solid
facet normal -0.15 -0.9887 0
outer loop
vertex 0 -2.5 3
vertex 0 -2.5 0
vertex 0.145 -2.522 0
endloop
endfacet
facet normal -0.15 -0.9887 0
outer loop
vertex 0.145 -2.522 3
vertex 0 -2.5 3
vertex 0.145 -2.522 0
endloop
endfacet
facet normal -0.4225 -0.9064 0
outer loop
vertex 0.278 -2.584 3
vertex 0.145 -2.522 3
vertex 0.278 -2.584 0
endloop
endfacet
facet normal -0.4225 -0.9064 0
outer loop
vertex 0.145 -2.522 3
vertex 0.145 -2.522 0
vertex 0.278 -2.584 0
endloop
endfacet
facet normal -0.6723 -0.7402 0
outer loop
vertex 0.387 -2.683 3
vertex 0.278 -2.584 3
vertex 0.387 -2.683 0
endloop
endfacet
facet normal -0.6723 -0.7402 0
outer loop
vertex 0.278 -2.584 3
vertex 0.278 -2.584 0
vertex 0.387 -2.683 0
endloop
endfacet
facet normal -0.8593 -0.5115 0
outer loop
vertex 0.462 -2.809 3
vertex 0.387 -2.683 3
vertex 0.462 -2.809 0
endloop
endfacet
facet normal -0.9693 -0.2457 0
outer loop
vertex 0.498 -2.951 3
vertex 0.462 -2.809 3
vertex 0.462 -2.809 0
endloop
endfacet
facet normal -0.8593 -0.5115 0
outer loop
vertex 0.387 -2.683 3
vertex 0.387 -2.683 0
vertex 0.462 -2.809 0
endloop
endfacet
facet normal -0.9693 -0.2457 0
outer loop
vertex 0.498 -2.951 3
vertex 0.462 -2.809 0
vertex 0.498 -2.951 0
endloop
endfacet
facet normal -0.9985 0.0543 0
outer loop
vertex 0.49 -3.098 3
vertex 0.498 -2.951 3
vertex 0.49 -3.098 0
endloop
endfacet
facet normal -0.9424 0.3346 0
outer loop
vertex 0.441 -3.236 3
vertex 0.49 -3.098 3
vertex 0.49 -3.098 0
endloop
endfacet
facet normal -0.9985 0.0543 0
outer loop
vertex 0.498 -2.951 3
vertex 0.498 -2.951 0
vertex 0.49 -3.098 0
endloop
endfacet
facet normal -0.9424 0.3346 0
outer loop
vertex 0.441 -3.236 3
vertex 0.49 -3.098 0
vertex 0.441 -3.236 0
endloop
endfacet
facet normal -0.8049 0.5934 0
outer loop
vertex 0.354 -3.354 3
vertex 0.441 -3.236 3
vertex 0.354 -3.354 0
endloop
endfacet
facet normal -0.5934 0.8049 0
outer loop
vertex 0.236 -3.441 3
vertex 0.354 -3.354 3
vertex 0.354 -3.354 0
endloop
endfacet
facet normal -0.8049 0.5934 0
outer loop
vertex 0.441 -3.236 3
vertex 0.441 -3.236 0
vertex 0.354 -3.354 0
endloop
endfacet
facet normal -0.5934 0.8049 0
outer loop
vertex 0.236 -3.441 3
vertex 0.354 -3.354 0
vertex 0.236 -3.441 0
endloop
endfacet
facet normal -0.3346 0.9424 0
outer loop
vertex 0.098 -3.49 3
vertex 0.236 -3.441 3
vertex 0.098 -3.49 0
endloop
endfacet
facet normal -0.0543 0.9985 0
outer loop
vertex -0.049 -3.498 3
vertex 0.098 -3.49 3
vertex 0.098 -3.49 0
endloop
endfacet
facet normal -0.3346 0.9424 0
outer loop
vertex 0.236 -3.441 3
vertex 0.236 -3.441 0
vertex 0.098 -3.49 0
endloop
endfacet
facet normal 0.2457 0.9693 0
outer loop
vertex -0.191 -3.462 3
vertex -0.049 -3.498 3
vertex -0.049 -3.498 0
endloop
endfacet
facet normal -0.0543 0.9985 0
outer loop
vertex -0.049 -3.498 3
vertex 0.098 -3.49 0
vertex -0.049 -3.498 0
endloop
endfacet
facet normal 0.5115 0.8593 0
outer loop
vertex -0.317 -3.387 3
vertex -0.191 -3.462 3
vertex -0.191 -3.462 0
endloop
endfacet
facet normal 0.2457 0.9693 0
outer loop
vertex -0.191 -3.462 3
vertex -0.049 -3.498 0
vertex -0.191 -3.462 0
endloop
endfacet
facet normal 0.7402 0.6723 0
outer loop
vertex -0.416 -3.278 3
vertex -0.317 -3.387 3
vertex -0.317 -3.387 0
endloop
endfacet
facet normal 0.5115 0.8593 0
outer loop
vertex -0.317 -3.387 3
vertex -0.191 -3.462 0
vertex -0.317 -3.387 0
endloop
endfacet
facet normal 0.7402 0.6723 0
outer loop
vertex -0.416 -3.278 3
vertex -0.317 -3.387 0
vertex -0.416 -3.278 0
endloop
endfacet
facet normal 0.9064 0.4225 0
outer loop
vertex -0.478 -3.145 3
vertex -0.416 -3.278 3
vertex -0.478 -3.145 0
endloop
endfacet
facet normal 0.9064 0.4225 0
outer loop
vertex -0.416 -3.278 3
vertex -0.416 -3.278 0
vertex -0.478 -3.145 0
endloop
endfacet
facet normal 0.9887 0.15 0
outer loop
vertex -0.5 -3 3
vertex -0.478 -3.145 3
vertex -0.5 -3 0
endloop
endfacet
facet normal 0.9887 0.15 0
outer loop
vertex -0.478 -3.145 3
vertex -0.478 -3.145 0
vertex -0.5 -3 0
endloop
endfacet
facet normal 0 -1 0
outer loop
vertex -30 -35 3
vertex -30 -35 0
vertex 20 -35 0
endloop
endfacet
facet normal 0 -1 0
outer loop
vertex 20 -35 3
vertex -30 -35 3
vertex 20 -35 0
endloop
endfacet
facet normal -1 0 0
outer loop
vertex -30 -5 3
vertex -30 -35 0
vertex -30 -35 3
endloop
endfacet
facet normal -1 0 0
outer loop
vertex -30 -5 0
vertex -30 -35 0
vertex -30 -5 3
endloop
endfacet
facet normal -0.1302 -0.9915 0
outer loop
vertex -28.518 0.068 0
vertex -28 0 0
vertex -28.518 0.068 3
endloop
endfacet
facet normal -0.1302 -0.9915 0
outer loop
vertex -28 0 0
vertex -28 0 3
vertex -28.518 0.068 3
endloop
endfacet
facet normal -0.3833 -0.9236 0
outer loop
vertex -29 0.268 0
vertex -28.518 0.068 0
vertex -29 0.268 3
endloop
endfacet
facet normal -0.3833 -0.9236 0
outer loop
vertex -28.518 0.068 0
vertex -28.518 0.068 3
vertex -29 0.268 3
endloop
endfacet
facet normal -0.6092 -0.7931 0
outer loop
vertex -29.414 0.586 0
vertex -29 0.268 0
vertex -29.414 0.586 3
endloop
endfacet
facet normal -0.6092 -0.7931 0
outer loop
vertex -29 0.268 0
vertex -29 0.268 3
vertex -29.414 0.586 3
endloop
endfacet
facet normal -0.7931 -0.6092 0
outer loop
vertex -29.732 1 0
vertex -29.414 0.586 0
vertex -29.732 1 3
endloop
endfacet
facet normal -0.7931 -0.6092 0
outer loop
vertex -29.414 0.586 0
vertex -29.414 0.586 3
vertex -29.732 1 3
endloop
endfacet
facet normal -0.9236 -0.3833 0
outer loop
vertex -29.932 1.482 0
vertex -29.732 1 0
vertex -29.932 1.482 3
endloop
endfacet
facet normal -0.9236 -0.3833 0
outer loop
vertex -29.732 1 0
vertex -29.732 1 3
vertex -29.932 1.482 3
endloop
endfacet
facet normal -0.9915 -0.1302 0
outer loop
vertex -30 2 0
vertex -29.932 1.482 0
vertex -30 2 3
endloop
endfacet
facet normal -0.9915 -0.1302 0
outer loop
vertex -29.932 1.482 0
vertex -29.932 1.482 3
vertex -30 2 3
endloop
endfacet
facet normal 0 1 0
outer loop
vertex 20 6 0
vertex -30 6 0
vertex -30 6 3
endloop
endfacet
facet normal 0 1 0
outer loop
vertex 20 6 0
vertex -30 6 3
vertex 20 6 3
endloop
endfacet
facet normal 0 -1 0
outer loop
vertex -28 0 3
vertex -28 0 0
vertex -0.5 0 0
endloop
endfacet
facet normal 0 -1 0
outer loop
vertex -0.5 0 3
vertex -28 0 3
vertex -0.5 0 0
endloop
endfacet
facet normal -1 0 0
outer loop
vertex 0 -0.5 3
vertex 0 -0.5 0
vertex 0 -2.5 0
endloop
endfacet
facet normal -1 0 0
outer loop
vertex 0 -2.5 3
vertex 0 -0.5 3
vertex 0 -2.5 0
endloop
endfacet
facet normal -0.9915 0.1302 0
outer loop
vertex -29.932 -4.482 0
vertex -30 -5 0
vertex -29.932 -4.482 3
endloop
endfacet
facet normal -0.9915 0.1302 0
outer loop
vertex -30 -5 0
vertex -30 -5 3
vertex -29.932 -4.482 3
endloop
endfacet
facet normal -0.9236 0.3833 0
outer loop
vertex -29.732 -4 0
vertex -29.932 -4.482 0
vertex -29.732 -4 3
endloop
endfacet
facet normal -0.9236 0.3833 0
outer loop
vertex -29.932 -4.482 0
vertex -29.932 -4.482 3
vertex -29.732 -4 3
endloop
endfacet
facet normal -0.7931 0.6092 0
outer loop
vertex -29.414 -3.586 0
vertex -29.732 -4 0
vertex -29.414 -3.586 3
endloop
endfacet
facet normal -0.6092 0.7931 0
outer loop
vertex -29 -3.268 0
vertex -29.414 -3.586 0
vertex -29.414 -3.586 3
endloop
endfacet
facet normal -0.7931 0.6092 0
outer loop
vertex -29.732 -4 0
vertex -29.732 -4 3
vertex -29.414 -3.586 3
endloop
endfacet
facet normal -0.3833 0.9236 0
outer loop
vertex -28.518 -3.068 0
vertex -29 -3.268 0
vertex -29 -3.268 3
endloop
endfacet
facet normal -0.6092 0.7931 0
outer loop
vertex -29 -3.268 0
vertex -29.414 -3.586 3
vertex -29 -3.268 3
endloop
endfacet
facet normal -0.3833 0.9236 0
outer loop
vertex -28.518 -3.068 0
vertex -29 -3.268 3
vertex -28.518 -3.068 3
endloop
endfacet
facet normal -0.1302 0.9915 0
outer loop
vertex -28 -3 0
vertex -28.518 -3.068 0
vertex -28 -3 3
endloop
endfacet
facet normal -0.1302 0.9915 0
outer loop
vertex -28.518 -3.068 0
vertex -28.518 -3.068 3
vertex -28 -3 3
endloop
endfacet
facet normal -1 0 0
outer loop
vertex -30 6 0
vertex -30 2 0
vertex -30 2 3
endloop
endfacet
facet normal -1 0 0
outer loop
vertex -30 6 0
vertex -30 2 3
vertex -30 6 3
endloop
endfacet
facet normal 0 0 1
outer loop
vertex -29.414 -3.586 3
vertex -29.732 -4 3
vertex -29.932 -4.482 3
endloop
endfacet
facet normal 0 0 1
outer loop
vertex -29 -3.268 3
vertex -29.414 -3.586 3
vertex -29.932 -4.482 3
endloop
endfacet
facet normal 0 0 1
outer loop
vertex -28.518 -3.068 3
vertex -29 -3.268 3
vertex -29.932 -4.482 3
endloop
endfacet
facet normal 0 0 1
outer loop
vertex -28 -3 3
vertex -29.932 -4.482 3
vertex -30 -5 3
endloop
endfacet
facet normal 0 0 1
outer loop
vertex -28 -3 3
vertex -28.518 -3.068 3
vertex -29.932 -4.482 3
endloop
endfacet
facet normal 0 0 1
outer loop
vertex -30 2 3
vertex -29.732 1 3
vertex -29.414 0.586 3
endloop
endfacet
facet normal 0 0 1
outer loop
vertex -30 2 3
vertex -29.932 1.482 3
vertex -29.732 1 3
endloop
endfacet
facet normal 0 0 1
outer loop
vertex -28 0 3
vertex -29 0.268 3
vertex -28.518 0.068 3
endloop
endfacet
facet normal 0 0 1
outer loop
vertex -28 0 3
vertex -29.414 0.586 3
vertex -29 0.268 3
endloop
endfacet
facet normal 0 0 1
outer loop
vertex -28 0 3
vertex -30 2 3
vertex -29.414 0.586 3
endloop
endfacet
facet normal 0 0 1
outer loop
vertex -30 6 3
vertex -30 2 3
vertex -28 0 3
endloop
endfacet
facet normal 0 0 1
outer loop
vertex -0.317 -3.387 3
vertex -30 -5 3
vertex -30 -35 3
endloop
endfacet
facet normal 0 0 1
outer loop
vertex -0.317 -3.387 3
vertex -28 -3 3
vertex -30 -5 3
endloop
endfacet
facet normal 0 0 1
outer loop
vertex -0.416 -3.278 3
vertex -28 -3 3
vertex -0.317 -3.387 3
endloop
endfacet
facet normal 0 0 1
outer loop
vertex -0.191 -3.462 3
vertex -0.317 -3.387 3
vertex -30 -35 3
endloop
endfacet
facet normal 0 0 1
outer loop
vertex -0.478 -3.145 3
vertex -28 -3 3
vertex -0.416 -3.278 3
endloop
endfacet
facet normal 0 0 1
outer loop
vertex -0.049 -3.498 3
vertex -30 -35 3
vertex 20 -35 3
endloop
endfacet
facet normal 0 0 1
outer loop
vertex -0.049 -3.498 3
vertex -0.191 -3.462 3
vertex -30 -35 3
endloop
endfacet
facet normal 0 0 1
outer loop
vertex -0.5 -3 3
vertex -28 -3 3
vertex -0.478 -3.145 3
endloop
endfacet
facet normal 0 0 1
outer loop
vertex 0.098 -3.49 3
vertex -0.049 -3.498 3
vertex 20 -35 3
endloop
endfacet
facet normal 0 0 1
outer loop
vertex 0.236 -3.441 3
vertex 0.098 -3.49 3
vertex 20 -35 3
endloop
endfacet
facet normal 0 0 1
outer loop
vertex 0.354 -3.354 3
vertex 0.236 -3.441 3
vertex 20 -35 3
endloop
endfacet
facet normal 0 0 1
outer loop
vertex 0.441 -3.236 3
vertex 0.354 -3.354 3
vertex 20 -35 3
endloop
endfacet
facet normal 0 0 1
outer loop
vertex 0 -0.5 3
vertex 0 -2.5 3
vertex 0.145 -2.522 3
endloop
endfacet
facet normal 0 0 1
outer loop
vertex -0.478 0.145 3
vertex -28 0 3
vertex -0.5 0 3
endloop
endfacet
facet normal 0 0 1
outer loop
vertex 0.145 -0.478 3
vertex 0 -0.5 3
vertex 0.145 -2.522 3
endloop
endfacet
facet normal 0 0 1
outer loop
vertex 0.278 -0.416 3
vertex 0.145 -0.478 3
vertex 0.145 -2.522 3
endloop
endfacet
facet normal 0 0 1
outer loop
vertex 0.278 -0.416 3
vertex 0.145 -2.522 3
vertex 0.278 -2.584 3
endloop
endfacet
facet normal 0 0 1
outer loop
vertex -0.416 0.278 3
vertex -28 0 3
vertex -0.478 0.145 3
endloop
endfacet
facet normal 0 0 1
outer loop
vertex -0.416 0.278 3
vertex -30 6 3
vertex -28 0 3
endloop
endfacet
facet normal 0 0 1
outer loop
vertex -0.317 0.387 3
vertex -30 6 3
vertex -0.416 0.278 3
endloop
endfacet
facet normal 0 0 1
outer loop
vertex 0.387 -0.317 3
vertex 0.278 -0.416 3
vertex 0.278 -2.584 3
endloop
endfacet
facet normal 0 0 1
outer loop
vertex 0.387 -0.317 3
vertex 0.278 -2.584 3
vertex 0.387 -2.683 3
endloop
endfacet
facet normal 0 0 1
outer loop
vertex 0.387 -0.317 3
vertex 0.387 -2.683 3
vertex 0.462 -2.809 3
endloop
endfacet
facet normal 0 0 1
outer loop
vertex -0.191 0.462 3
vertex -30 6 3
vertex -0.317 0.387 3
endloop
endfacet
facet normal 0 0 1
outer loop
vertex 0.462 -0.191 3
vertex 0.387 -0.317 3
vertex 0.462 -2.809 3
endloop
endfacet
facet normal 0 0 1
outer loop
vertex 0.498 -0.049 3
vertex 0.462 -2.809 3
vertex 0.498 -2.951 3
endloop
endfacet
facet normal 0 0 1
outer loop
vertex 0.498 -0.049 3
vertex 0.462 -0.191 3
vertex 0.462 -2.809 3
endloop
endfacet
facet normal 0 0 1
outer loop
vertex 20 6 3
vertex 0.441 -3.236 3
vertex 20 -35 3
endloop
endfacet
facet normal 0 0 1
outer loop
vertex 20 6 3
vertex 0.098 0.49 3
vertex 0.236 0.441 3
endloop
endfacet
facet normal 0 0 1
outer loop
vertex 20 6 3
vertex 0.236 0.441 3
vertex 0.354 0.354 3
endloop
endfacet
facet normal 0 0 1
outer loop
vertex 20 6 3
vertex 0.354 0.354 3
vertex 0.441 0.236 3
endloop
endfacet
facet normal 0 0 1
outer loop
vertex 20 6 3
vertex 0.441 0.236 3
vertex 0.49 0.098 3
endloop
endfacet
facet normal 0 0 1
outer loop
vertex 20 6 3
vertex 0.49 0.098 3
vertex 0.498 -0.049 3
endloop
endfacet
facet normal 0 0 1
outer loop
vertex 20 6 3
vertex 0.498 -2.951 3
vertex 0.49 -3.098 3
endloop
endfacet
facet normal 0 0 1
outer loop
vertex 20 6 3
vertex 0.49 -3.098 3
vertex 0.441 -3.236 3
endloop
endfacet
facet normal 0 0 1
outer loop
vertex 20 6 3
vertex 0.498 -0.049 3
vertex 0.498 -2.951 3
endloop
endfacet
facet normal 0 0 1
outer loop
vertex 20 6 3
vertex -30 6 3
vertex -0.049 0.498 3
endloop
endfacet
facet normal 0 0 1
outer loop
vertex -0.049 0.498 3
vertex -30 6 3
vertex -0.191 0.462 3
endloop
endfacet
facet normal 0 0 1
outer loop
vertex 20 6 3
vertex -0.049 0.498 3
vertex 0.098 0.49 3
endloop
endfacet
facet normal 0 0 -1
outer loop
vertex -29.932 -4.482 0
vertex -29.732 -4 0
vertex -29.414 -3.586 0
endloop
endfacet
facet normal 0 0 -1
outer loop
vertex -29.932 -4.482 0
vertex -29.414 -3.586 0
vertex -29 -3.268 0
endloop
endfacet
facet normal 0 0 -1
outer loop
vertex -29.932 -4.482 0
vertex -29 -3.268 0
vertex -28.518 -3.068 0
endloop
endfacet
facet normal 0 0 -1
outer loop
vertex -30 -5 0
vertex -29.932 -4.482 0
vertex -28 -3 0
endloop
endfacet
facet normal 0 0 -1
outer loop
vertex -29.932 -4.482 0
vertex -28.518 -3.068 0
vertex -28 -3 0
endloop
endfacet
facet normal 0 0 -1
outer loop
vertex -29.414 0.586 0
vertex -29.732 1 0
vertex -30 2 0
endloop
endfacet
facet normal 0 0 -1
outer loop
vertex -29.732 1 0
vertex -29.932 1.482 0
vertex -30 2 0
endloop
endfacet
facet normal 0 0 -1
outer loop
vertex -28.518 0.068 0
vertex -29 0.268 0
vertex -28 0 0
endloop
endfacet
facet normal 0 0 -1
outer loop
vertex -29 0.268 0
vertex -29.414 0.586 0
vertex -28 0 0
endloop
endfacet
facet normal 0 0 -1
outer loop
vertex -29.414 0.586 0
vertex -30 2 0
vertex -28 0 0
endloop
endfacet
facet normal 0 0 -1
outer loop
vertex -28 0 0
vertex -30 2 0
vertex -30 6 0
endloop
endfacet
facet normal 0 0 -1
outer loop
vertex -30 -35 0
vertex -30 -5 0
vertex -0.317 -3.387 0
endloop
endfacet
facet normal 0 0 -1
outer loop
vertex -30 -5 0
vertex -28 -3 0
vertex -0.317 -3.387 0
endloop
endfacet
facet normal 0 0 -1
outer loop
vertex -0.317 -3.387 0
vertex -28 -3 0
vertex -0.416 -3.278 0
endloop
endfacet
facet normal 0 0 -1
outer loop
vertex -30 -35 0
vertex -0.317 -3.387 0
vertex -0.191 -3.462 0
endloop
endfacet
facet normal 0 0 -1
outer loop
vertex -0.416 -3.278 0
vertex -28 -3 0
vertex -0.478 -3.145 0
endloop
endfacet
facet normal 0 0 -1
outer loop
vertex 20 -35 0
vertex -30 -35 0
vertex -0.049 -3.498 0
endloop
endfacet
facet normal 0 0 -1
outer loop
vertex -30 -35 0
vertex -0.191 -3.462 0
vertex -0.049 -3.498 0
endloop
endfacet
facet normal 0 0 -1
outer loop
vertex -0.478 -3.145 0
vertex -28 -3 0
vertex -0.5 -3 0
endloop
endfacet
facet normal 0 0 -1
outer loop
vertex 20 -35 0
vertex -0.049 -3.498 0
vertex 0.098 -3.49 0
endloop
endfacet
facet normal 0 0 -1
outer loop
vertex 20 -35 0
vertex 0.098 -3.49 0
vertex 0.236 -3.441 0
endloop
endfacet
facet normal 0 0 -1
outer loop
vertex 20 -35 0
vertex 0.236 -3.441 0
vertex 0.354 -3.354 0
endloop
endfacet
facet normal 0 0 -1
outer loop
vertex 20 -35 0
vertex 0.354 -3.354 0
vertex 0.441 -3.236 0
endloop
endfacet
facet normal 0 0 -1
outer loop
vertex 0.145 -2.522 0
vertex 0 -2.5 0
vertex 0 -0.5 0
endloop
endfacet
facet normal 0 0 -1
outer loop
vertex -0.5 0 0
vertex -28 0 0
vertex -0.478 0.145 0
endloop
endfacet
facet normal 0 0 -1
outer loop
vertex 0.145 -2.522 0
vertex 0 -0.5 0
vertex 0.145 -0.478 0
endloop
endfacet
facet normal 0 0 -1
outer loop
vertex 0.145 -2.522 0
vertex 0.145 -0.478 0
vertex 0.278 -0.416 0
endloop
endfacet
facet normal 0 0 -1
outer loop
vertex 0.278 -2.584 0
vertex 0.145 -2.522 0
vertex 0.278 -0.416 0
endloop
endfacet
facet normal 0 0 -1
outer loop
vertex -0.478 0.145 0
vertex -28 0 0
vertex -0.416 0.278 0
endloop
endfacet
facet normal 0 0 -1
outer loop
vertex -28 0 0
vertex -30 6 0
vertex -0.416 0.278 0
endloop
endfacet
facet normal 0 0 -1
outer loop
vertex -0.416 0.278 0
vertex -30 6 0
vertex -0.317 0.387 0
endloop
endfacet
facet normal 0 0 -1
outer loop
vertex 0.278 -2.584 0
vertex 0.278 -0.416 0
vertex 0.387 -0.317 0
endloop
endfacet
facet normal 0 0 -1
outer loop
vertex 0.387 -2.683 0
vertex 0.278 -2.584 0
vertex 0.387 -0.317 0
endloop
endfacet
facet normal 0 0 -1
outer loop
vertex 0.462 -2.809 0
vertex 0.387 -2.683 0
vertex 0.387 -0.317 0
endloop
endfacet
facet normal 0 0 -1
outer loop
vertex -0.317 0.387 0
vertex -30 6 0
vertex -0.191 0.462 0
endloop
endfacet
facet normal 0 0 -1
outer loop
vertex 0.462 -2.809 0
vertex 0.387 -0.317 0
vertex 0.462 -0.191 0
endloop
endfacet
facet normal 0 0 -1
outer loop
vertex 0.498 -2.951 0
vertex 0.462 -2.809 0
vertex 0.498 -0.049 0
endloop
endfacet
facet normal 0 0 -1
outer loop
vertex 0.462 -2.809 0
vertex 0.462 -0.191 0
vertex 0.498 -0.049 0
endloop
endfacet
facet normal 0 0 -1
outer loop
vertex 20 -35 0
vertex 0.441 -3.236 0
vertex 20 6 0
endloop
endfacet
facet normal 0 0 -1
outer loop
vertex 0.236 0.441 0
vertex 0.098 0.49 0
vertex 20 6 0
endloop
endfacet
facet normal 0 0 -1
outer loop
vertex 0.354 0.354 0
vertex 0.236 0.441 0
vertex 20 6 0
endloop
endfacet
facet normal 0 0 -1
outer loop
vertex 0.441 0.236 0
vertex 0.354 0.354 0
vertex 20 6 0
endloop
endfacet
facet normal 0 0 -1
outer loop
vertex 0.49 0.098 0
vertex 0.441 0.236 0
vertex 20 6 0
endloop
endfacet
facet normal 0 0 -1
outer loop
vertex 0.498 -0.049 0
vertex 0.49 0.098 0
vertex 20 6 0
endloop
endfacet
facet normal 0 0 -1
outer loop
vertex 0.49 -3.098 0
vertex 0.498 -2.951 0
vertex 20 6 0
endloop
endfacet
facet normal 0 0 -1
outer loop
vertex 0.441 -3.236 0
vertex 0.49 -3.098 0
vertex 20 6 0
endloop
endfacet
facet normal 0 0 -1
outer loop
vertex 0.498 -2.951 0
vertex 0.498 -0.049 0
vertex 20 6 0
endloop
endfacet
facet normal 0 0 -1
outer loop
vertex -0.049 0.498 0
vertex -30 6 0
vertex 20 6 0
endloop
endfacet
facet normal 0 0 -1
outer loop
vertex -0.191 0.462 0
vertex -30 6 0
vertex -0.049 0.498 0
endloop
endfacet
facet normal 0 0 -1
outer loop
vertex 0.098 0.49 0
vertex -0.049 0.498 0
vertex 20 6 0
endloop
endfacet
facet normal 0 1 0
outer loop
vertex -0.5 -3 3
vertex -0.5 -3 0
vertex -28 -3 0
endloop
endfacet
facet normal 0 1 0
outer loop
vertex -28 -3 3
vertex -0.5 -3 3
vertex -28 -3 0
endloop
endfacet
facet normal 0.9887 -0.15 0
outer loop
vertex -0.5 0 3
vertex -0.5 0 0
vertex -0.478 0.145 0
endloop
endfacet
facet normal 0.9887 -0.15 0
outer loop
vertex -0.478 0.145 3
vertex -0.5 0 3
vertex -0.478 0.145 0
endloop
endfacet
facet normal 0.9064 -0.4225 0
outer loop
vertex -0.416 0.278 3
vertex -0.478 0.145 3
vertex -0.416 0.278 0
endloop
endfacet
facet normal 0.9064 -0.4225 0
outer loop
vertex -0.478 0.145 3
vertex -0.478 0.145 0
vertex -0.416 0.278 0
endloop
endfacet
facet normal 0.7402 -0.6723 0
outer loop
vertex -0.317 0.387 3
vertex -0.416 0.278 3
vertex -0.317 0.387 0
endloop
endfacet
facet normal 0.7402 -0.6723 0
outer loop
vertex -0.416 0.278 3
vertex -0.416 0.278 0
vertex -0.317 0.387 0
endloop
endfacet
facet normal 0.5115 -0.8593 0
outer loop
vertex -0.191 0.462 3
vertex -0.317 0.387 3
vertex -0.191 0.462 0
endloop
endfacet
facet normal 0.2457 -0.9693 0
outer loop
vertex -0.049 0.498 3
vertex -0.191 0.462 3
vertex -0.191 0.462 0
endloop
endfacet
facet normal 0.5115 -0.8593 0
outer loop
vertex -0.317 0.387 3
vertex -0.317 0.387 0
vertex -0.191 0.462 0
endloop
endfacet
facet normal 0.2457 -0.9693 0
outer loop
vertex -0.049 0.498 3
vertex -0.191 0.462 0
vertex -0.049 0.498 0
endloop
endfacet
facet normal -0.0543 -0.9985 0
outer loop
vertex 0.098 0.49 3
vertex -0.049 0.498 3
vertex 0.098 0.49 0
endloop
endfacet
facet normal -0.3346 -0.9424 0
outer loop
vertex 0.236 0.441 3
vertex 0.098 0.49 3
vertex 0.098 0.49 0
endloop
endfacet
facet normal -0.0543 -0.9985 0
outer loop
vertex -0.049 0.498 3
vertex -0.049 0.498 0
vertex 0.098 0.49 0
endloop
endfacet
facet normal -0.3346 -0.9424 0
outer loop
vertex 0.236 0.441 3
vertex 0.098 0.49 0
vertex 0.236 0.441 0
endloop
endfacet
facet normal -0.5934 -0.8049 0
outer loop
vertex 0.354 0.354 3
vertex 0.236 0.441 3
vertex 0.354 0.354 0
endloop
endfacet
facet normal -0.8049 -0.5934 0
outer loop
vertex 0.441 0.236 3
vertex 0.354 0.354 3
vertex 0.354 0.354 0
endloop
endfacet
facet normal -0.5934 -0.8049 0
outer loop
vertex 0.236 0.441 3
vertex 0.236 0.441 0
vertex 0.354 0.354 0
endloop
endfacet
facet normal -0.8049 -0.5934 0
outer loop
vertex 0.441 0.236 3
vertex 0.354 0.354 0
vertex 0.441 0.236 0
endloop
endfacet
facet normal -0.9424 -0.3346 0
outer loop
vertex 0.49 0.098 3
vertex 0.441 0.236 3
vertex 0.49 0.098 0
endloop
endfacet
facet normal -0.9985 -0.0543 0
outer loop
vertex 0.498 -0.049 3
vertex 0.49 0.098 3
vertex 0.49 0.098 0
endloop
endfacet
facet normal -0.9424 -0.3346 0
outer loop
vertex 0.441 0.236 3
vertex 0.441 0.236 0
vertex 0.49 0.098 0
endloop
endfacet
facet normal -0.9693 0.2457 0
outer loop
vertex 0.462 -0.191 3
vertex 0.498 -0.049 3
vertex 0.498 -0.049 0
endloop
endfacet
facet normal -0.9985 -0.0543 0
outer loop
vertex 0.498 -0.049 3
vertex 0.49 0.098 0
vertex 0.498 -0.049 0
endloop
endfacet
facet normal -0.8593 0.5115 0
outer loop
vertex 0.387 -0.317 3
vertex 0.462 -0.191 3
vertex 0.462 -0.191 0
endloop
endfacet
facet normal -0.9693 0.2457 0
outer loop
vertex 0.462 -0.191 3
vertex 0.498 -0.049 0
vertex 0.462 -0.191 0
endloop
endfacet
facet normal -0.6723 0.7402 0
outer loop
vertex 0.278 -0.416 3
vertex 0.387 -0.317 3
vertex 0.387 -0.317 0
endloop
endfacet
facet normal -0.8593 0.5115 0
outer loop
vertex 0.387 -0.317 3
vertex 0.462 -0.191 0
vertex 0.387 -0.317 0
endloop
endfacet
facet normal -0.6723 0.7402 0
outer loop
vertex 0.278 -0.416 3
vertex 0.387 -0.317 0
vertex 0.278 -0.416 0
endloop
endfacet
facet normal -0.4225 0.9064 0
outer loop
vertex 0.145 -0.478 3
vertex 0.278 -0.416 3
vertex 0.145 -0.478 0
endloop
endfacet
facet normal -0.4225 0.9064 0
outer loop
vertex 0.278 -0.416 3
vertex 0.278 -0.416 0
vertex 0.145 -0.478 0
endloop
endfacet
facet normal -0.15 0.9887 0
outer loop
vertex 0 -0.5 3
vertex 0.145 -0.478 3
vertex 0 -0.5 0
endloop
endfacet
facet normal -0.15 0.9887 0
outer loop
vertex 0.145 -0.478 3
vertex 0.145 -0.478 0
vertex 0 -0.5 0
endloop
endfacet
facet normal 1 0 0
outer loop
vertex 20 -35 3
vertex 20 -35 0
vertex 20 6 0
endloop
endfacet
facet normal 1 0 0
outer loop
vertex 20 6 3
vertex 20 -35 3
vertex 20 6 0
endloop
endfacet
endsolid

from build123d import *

# Parameters (mm, degrees)
SKETCH1_W           = 50
SKETCH1_H           = 41
BOSS_EXTRUDE1_DEPTH = 3
CUT_EXTRUDE1_DEPTH  = 47.19523785
FILLET1_R           = 2


with BuildPart() as part:
    # Sketch1 → Boss-Extrude1 (new body)
    with BuildSketch(Plane.XY):
        with Locations((-5, -14.5)):
            Rectangle(SKETCH1_W, SKETCH1_H)
    extrude(amount=BOSS_EXTRUDE1_DEPTH)

    # Sketch2 → Cut-Extrude1 (cut, through all)
    with BuildSketch(Plane.XY):
        with BuildLine():
            Line((-30, 0), (-0.5, 0))
            ThreePointArc((-0.5, 0), (0.353553391, 0.353553391), (0, -0.5))
            Line((0, -0.5), (0, -2.5))
            ThreePointArc((0, -2.5), (0.353553391, -3.353553391), (-0.5, -3))
            Line((-0.5, -3), (-30, -3))
            Line((-30, -3), (-30, 0))
        make_face()
    extrude(amount=CUT_EXTRUDE1_DEPTH, mode=Mode.SUBTRACT)

    # Fillet1
    fillet1_edges = [part.edges().sort_by_distance(p)[0] for p in [
        (-30, 0, 1.5),
        (-30, -3, 1.5),
    ]]
    fillet(fillet1_edges, radius=FILLET1_R)


solid = part.part
